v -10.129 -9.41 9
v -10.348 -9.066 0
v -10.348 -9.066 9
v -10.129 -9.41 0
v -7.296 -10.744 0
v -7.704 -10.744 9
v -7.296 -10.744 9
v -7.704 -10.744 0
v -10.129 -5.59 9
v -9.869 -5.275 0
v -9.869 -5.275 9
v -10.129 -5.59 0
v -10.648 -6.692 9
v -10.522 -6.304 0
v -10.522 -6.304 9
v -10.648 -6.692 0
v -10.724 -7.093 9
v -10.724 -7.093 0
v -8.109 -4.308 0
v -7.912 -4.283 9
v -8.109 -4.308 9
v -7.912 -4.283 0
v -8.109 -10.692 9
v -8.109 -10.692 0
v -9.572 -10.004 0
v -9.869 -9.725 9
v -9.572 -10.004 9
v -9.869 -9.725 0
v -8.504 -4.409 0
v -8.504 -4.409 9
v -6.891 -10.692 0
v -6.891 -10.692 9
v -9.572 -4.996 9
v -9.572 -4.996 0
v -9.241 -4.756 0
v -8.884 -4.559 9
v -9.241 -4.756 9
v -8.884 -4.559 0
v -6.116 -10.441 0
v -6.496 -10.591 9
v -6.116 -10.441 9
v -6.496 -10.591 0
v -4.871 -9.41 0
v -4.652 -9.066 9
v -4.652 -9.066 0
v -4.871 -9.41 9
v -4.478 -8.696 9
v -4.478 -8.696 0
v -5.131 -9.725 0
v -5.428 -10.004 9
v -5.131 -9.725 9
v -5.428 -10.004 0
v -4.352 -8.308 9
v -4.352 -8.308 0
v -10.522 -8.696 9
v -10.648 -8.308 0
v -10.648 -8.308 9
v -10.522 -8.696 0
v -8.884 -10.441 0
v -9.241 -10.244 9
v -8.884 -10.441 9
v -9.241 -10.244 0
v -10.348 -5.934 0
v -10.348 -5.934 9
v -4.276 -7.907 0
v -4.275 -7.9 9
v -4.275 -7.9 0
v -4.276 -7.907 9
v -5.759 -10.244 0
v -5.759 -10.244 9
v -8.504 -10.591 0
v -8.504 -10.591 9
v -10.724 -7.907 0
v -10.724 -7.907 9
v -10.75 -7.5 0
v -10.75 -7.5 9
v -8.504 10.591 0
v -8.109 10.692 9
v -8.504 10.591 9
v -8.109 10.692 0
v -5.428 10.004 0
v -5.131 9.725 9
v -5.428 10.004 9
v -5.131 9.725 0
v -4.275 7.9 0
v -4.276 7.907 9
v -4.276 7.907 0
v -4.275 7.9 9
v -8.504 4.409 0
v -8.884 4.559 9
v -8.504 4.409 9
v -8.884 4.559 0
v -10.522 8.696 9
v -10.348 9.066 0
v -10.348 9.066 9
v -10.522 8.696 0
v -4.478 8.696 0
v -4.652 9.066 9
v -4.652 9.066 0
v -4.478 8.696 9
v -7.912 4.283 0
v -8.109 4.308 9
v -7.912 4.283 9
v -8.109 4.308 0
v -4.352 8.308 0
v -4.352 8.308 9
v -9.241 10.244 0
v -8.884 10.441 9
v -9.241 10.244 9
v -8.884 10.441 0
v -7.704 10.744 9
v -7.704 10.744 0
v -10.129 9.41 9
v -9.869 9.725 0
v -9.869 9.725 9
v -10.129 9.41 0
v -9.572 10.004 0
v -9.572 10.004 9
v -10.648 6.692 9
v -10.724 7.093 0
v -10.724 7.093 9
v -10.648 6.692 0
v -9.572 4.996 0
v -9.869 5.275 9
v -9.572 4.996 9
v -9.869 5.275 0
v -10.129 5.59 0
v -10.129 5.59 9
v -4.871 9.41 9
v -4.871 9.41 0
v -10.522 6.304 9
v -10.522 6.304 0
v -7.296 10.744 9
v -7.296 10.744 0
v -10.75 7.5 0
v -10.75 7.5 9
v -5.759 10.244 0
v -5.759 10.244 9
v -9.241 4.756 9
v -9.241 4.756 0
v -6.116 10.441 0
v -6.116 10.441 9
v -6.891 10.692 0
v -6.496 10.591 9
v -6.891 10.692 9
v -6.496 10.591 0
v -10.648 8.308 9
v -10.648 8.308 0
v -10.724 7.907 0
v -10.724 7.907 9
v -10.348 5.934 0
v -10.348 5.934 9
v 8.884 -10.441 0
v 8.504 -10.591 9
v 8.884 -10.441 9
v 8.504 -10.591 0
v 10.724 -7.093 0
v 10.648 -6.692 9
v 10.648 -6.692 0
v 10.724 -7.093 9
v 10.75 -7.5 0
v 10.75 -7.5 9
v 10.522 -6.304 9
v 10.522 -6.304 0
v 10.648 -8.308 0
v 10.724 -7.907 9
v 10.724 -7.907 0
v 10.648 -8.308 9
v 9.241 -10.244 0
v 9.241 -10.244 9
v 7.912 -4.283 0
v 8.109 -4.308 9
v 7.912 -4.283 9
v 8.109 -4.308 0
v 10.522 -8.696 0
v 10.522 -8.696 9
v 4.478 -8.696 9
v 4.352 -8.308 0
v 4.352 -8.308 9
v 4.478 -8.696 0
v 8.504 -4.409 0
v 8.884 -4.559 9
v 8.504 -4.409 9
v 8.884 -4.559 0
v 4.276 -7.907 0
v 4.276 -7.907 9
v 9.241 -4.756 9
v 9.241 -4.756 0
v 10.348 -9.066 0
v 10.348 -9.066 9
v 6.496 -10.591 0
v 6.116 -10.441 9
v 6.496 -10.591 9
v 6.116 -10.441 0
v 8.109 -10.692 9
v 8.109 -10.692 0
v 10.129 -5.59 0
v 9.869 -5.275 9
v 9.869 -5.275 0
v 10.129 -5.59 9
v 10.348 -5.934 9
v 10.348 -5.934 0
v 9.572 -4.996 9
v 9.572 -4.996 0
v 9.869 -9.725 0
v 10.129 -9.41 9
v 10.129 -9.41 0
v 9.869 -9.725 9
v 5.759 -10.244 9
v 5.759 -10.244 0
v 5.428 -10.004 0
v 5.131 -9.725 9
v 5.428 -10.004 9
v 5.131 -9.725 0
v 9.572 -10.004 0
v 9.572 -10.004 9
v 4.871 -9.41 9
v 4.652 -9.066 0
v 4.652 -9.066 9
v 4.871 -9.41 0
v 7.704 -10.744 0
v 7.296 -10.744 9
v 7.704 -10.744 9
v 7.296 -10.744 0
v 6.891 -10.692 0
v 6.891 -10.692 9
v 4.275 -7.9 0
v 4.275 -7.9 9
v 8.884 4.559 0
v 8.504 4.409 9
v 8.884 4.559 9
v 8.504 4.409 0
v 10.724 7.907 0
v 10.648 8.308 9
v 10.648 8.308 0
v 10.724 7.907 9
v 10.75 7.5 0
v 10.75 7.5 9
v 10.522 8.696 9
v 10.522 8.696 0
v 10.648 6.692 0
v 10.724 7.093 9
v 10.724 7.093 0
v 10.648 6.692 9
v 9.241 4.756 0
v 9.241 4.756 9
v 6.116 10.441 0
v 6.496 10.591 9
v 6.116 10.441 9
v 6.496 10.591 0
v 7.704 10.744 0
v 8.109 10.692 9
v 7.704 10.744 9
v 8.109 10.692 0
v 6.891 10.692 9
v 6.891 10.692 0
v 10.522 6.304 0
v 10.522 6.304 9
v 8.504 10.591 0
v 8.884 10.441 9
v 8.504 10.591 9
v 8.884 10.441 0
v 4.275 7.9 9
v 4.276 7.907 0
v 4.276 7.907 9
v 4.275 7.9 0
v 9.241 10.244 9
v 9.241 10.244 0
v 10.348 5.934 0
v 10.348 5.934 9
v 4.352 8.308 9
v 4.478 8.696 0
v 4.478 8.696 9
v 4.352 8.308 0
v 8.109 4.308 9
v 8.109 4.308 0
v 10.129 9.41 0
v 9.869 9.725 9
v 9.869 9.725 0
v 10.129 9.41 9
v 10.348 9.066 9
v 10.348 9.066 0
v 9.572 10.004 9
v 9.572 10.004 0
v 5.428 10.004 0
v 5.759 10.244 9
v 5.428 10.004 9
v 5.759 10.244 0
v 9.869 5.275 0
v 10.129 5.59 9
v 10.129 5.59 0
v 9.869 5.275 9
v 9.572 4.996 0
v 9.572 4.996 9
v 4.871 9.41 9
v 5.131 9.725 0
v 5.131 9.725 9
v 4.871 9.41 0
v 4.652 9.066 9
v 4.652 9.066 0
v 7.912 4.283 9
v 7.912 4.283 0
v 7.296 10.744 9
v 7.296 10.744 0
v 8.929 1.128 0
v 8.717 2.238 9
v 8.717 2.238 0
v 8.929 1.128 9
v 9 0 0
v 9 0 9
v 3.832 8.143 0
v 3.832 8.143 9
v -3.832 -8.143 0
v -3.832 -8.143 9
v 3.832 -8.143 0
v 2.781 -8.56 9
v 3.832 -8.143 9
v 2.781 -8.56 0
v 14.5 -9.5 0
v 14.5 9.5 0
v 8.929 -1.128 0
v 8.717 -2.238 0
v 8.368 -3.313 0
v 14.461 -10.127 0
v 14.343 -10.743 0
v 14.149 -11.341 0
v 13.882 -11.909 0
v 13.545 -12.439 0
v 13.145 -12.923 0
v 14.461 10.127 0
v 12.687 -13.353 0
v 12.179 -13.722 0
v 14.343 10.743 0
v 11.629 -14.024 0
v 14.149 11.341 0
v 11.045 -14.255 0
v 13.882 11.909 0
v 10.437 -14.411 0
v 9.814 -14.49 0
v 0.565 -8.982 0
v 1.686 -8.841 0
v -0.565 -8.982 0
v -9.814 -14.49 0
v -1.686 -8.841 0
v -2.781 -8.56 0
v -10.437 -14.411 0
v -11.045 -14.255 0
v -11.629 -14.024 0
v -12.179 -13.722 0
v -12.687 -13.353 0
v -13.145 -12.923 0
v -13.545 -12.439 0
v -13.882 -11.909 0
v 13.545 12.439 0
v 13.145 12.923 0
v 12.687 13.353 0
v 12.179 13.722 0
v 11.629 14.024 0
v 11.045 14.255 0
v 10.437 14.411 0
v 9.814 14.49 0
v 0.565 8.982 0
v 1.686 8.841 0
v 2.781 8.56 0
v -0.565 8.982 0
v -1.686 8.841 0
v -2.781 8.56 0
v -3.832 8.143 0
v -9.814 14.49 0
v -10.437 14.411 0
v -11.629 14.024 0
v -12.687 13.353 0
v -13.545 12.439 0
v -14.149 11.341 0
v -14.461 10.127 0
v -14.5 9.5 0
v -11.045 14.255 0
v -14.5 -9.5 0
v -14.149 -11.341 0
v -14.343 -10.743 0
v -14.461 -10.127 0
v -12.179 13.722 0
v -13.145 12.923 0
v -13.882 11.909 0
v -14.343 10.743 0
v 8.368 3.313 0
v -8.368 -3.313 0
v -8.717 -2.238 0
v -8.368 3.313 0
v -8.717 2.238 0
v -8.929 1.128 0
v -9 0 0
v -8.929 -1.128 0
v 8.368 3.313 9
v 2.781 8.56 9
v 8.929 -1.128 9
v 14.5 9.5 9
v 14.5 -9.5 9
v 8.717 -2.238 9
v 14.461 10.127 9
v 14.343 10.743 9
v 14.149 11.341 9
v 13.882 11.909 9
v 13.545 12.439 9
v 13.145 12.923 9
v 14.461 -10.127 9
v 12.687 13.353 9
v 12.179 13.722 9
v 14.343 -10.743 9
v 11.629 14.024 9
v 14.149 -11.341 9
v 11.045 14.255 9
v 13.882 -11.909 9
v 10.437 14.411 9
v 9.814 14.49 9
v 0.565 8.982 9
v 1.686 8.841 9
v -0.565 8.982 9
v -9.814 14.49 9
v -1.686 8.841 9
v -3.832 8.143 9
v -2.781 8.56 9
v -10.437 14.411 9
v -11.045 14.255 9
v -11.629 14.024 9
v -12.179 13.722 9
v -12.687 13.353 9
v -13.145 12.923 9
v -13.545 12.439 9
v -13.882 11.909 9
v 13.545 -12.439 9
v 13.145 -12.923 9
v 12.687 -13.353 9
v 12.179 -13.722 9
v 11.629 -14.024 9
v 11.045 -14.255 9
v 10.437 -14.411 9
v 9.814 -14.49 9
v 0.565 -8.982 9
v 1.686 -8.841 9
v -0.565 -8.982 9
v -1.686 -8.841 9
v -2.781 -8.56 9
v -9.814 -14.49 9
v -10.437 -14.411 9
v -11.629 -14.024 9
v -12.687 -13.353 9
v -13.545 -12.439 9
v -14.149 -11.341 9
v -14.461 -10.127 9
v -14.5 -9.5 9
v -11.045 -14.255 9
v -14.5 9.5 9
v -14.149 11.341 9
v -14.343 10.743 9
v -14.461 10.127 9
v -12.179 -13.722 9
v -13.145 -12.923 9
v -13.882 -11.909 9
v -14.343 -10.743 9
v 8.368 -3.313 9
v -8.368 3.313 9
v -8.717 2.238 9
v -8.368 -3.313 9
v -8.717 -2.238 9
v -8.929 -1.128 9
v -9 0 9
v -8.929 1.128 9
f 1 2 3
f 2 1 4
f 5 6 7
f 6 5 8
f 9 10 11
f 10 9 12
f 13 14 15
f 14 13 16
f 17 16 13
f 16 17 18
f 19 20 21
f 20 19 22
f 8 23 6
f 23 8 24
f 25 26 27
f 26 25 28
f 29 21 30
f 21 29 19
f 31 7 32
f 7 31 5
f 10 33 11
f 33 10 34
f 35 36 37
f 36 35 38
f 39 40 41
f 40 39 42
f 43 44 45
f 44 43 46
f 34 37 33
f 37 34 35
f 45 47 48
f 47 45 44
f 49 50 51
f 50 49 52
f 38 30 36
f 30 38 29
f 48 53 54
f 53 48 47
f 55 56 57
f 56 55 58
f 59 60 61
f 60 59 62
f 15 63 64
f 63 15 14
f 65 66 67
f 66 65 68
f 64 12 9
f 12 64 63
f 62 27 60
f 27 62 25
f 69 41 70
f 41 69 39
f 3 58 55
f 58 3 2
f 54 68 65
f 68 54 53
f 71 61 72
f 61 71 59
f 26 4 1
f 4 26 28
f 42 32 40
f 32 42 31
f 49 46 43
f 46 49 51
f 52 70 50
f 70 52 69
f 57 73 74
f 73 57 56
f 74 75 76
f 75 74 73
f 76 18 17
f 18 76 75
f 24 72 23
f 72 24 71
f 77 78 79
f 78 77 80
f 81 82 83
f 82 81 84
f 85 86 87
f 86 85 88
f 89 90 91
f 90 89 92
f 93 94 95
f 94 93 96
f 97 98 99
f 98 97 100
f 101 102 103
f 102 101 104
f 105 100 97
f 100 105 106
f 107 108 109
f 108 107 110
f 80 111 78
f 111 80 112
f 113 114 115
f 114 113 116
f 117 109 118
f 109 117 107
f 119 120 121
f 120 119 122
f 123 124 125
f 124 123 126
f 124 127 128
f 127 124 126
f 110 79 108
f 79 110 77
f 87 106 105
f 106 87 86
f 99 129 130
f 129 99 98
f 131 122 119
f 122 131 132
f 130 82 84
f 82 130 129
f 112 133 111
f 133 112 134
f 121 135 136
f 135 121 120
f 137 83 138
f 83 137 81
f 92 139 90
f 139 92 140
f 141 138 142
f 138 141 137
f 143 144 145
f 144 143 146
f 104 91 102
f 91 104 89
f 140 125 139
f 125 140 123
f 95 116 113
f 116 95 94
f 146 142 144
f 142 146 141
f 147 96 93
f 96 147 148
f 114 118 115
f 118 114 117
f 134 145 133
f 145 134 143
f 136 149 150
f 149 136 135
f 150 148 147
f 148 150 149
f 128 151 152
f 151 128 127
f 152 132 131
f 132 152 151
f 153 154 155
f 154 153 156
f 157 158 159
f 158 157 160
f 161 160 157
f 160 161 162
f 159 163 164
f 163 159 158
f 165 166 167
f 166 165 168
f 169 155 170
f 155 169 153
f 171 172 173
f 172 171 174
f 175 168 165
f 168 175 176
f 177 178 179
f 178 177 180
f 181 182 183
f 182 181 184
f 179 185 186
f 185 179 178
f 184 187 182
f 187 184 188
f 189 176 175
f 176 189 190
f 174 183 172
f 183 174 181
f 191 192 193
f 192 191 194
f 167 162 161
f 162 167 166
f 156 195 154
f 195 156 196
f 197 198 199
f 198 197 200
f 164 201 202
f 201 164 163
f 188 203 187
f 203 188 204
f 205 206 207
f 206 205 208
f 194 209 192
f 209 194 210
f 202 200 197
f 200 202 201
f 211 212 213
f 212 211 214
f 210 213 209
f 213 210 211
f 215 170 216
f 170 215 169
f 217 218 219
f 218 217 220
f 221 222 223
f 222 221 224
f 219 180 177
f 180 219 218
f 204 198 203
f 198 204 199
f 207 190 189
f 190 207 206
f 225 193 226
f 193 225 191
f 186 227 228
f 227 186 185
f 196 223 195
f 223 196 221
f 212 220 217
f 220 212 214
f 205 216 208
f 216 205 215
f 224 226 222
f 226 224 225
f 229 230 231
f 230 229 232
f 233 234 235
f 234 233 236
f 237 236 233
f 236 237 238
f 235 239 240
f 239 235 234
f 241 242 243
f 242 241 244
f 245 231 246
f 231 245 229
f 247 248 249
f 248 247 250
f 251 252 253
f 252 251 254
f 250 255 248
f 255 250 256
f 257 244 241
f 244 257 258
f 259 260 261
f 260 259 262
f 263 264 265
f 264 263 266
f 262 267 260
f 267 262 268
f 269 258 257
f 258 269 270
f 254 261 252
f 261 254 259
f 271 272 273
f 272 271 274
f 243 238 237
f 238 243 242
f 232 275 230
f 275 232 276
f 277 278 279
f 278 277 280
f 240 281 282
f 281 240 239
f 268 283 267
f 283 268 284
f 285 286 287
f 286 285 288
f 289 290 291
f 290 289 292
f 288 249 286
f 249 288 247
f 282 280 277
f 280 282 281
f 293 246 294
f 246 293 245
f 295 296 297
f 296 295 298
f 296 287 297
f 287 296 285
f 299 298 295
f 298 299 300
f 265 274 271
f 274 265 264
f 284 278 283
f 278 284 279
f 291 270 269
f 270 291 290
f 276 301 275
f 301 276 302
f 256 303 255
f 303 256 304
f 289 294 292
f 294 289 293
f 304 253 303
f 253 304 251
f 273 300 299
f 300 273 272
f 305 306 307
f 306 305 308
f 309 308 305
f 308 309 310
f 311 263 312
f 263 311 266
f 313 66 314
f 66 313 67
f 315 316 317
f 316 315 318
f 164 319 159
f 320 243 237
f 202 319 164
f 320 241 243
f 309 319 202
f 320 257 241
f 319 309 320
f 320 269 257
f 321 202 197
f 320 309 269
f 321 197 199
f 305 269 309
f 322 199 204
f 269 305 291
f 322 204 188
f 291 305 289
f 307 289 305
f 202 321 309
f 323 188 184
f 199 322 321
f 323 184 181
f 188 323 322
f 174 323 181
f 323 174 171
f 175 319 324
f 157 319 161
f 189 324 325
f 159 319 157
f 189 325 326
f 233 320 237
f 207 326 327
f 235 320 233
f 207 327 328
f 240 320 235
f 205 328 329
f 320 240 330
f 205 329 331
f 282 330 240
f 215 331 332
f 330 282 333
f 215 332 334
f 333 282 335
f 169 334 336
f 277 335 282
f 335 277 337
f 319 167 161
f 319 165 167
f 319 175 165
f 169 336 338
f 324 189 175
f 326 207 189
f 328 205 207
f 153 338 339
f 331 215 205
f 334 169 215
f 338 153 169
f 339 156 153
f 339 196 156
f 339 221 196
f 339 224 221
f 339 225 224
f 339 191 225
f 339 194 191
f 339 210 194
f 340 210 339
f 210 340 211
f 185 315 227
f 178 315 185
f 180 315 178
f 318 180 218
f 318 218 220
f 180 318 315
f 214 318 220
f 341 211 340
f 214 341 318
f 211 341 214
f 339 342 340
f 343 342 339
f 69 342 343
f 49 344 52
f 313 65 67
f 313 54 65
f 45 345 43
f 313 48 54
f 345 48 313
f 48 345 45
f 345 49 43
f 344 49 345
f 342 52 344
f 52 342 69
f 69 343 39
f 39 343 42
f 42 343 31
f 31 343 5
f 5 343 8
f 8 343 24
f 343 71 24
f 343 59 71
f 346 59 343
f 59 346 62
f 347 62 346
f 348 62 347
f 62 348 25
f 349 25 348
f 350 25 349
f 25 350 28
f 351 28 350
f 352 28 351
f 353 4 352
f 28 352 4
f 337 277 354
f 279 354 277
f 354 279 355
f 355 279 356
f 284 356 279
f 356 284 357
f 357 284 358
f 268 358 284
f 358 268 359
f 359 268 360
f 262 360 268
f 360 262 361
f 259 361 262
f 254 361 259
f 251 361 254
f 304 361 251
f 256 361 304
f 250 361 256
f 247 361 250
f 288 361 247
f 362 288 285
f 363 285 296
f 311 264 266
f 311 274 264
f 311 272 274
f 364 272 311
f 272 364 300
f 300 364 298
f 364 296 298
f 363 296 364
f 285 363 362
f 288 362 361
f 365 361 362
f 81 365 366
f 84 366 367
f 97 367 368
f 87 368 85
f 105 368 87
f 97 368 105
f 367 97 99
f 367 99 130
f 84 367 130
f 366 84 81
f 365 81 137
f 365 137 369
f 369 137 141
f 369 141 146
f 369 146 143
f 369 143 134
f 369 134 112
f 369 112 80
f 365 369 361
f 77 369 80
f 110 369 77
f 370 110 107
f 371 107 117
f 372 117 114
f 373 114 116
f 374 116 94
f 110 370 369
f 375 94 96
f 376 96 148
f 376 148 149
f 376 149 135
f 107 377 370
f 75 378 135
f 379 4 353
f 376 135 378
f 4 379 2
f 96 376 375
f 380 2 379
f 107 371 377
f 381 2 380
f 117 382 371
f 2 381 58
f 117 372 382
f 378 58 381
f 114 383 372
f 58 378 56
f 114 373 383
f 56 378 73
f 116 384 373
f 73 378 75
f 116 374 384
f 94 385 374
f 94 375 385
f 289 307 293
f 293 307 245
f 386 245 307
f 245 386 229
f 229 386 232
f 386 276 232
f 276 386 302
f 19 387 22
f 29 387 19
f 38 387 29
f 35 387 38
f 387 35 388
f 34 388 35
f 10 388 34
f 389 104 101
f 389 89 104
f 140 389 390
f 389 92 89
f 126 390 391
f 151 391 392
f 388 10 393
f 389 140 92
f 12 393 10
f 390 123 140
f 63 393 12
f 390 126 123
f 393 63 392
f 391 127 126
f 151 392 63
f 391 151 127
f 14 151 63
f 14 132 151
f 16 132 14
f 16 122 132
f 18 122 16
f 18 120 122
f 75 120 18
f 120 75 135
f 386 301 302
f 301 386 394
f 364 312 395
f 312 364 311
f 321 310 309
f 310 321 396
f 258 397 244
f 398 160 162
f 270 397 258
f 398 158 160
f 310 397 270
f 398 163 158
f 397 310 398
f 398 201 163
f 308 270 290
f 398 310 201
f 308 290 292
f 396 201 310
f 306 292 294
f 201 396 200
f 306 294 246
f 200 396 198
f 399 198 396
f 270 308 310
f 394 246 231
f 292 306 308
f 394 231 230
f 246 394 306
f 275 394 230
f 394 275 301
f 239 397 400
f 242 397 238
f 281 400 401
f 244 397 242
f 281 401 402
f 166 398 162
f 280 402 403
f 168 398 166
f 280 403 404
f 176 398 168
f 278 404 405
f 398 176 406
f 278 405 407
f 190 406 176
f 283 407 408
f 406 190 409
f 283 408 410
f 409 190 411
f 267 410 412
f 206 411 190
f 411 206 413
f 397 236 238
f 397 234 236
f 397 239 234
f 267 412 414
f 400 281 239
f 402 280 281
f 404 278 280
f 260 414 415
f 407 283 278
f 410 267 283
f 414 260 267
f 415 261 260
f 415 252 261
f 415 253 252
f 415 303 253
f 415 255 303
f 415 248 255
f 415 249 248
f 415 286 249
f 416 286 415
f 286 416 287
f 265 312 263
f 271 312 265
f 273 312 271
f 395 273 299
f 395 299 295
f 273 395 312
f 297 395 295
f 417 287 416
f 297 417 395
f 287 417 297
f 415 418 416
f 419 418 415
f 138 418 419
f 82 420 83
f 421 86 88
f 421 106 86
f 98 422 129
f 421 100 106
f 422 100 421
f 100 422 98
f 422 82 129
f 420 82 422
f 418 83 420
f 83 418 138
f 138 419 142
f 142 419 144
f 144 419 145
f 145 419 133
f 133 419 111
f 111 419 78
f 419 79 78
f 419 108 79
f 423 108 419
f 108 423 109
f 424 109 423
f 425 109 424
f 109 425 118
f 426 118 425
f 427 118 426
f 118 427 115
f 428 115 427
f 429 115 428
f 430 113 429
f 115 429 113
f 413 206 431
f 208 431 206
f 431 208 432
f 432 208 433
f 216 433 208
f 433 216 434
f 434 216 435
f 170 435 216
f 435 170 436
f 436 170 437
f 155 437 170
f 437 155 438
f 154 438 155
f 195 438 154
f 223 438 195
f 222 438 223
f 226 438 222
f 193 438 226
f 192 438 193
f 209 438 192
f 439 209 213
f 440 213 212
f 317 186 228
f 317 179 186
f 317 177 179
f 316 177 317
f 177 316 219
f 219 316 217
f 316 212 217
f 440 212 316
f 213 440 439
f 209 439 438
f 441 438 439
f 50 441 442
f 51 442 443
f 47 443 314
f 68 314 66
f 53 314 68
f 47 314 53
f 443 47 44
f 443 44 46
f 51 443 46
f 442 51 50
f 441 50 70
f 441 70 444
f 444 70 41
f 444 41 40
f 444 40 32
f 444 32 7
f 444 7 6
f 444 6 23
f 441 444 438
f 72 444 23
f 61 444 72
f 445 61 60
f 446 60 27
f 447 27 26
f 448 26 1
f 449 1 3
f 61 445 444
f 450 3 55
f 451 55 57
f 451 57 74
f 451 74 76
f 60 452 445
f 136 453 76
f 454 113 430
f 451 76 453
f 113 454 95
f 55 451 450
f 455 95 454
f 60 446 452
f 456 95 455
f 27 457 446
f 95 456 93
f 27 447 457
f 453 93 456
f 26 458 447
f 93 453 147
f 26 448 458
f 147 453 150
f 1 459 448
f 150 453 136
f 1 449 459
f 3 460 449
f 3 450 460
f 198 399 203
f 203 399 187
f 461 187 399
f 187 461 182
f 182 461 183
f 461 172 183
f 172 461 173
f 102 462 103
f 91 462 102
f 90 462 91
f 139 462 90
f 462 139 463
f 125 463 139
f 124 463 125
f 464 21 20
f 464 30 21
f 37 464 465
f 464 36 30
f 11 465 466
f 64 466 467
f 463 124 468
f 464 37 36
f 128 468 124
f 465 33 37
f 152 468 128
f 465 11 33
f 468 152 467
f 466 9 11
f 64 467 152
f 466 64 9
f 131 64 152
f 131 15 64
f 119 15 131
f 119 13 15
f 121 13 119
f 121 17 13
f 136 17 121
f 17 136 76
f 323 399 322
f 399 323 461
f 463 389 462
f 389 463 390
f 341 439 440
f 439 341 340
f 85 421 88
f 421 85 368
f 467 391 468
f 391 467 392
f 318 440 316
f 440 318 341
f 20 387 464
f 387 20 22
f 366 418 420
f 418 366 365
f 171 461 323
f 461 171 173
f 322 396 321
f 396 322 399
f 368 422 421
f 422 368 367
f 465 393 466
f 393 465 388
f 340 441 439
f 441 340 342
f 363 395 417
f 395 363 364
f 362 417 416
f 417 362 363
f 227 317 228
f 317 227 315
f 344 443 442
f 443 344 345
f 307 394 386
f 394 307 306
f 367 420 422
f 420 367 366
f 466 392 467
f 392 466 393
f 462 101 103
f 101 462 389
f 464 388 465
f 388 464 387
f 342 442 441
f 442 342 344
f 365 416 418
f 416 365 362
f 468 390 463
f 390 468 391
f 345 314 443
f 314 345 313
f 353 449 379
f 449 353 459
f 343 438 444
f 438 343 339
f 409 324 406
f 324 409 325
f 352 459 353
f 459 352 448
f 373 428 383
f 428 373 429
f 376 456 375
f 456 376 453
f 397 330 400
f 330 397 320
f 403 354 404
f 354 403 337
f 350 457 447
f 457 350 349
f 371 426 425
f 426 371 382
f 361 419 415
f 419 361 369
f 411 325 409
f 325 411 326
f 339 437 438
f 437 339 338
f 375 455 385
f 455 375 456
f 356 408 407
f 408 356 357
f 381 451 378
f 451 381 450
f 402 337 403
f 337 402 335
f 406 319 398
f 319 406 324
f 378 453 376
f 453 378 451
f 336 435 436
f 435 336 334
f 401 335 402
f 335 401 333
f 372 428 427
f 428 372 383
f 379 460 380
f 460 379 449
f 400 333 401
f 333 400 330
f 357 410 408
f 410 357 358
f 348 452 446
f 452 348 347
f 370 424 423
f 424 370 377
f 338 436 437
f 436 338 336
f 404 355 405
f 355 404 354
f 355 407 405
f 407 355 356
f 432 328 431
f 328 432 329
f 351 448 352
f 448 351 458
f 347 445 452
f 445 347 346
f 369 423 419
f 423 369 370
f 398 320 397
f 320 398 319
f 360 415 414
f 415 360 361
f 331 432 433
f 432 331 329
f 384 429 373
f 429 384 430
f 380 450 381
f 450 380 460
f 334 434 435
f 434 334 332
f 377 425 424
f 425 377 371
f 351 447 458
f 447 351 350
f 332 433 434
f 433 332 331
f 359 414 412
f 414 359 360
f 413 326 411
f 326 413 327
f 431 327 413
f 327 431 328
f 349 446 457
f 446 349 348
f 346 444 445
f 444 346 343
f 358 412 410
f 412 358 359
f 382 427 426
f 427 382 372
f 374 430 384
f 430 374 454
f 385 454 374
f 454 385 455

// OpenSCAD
$fn = 50;


difference() {
	union() {
		hull() {
			translate(v = [-9.5000000000, 9.5000000000, 0]) {
				cylinder(h = 9, r = 5);
			}
			translate(v = [9.5000000000, 9.5000000000, 0]) {
				cylinder(h = 9, r = 5);
			}
			translate(v = [-9.5000000000, -9.5000000000, 0]) {
				cylinder(h = 9, r = 5);
			}
			translate(v = [9.5000000000, -9.5000000000, 0]) {
				cylinder(h = 9, r = 5);
			}
		}
	}
	union() {
		#translate(v = [-7.5000000000, -7.5000000000, -100.0000000000]) {
			cylinder(h = 200, r = 3.2500000000);
		}
		#translate(v = [-7.5000000000, 7.5000000000, -100.0000000000]) {
			cylinder(h = 200, r = 3.2500000000);
		}
		#translate(v = [7.5000000000, -7.5000000000, -100.0000000000]) {
			cylinder(h = 200, r = 3.2500000000);
		}
		#translate(v = [7.5000000000, 7.5000000000, -100.0000000000]) {
			cylinder(h = 200, r = 3.2500000000);
		}
		#cylinder(h = 9, r = 9.0000000000);
	}
}
